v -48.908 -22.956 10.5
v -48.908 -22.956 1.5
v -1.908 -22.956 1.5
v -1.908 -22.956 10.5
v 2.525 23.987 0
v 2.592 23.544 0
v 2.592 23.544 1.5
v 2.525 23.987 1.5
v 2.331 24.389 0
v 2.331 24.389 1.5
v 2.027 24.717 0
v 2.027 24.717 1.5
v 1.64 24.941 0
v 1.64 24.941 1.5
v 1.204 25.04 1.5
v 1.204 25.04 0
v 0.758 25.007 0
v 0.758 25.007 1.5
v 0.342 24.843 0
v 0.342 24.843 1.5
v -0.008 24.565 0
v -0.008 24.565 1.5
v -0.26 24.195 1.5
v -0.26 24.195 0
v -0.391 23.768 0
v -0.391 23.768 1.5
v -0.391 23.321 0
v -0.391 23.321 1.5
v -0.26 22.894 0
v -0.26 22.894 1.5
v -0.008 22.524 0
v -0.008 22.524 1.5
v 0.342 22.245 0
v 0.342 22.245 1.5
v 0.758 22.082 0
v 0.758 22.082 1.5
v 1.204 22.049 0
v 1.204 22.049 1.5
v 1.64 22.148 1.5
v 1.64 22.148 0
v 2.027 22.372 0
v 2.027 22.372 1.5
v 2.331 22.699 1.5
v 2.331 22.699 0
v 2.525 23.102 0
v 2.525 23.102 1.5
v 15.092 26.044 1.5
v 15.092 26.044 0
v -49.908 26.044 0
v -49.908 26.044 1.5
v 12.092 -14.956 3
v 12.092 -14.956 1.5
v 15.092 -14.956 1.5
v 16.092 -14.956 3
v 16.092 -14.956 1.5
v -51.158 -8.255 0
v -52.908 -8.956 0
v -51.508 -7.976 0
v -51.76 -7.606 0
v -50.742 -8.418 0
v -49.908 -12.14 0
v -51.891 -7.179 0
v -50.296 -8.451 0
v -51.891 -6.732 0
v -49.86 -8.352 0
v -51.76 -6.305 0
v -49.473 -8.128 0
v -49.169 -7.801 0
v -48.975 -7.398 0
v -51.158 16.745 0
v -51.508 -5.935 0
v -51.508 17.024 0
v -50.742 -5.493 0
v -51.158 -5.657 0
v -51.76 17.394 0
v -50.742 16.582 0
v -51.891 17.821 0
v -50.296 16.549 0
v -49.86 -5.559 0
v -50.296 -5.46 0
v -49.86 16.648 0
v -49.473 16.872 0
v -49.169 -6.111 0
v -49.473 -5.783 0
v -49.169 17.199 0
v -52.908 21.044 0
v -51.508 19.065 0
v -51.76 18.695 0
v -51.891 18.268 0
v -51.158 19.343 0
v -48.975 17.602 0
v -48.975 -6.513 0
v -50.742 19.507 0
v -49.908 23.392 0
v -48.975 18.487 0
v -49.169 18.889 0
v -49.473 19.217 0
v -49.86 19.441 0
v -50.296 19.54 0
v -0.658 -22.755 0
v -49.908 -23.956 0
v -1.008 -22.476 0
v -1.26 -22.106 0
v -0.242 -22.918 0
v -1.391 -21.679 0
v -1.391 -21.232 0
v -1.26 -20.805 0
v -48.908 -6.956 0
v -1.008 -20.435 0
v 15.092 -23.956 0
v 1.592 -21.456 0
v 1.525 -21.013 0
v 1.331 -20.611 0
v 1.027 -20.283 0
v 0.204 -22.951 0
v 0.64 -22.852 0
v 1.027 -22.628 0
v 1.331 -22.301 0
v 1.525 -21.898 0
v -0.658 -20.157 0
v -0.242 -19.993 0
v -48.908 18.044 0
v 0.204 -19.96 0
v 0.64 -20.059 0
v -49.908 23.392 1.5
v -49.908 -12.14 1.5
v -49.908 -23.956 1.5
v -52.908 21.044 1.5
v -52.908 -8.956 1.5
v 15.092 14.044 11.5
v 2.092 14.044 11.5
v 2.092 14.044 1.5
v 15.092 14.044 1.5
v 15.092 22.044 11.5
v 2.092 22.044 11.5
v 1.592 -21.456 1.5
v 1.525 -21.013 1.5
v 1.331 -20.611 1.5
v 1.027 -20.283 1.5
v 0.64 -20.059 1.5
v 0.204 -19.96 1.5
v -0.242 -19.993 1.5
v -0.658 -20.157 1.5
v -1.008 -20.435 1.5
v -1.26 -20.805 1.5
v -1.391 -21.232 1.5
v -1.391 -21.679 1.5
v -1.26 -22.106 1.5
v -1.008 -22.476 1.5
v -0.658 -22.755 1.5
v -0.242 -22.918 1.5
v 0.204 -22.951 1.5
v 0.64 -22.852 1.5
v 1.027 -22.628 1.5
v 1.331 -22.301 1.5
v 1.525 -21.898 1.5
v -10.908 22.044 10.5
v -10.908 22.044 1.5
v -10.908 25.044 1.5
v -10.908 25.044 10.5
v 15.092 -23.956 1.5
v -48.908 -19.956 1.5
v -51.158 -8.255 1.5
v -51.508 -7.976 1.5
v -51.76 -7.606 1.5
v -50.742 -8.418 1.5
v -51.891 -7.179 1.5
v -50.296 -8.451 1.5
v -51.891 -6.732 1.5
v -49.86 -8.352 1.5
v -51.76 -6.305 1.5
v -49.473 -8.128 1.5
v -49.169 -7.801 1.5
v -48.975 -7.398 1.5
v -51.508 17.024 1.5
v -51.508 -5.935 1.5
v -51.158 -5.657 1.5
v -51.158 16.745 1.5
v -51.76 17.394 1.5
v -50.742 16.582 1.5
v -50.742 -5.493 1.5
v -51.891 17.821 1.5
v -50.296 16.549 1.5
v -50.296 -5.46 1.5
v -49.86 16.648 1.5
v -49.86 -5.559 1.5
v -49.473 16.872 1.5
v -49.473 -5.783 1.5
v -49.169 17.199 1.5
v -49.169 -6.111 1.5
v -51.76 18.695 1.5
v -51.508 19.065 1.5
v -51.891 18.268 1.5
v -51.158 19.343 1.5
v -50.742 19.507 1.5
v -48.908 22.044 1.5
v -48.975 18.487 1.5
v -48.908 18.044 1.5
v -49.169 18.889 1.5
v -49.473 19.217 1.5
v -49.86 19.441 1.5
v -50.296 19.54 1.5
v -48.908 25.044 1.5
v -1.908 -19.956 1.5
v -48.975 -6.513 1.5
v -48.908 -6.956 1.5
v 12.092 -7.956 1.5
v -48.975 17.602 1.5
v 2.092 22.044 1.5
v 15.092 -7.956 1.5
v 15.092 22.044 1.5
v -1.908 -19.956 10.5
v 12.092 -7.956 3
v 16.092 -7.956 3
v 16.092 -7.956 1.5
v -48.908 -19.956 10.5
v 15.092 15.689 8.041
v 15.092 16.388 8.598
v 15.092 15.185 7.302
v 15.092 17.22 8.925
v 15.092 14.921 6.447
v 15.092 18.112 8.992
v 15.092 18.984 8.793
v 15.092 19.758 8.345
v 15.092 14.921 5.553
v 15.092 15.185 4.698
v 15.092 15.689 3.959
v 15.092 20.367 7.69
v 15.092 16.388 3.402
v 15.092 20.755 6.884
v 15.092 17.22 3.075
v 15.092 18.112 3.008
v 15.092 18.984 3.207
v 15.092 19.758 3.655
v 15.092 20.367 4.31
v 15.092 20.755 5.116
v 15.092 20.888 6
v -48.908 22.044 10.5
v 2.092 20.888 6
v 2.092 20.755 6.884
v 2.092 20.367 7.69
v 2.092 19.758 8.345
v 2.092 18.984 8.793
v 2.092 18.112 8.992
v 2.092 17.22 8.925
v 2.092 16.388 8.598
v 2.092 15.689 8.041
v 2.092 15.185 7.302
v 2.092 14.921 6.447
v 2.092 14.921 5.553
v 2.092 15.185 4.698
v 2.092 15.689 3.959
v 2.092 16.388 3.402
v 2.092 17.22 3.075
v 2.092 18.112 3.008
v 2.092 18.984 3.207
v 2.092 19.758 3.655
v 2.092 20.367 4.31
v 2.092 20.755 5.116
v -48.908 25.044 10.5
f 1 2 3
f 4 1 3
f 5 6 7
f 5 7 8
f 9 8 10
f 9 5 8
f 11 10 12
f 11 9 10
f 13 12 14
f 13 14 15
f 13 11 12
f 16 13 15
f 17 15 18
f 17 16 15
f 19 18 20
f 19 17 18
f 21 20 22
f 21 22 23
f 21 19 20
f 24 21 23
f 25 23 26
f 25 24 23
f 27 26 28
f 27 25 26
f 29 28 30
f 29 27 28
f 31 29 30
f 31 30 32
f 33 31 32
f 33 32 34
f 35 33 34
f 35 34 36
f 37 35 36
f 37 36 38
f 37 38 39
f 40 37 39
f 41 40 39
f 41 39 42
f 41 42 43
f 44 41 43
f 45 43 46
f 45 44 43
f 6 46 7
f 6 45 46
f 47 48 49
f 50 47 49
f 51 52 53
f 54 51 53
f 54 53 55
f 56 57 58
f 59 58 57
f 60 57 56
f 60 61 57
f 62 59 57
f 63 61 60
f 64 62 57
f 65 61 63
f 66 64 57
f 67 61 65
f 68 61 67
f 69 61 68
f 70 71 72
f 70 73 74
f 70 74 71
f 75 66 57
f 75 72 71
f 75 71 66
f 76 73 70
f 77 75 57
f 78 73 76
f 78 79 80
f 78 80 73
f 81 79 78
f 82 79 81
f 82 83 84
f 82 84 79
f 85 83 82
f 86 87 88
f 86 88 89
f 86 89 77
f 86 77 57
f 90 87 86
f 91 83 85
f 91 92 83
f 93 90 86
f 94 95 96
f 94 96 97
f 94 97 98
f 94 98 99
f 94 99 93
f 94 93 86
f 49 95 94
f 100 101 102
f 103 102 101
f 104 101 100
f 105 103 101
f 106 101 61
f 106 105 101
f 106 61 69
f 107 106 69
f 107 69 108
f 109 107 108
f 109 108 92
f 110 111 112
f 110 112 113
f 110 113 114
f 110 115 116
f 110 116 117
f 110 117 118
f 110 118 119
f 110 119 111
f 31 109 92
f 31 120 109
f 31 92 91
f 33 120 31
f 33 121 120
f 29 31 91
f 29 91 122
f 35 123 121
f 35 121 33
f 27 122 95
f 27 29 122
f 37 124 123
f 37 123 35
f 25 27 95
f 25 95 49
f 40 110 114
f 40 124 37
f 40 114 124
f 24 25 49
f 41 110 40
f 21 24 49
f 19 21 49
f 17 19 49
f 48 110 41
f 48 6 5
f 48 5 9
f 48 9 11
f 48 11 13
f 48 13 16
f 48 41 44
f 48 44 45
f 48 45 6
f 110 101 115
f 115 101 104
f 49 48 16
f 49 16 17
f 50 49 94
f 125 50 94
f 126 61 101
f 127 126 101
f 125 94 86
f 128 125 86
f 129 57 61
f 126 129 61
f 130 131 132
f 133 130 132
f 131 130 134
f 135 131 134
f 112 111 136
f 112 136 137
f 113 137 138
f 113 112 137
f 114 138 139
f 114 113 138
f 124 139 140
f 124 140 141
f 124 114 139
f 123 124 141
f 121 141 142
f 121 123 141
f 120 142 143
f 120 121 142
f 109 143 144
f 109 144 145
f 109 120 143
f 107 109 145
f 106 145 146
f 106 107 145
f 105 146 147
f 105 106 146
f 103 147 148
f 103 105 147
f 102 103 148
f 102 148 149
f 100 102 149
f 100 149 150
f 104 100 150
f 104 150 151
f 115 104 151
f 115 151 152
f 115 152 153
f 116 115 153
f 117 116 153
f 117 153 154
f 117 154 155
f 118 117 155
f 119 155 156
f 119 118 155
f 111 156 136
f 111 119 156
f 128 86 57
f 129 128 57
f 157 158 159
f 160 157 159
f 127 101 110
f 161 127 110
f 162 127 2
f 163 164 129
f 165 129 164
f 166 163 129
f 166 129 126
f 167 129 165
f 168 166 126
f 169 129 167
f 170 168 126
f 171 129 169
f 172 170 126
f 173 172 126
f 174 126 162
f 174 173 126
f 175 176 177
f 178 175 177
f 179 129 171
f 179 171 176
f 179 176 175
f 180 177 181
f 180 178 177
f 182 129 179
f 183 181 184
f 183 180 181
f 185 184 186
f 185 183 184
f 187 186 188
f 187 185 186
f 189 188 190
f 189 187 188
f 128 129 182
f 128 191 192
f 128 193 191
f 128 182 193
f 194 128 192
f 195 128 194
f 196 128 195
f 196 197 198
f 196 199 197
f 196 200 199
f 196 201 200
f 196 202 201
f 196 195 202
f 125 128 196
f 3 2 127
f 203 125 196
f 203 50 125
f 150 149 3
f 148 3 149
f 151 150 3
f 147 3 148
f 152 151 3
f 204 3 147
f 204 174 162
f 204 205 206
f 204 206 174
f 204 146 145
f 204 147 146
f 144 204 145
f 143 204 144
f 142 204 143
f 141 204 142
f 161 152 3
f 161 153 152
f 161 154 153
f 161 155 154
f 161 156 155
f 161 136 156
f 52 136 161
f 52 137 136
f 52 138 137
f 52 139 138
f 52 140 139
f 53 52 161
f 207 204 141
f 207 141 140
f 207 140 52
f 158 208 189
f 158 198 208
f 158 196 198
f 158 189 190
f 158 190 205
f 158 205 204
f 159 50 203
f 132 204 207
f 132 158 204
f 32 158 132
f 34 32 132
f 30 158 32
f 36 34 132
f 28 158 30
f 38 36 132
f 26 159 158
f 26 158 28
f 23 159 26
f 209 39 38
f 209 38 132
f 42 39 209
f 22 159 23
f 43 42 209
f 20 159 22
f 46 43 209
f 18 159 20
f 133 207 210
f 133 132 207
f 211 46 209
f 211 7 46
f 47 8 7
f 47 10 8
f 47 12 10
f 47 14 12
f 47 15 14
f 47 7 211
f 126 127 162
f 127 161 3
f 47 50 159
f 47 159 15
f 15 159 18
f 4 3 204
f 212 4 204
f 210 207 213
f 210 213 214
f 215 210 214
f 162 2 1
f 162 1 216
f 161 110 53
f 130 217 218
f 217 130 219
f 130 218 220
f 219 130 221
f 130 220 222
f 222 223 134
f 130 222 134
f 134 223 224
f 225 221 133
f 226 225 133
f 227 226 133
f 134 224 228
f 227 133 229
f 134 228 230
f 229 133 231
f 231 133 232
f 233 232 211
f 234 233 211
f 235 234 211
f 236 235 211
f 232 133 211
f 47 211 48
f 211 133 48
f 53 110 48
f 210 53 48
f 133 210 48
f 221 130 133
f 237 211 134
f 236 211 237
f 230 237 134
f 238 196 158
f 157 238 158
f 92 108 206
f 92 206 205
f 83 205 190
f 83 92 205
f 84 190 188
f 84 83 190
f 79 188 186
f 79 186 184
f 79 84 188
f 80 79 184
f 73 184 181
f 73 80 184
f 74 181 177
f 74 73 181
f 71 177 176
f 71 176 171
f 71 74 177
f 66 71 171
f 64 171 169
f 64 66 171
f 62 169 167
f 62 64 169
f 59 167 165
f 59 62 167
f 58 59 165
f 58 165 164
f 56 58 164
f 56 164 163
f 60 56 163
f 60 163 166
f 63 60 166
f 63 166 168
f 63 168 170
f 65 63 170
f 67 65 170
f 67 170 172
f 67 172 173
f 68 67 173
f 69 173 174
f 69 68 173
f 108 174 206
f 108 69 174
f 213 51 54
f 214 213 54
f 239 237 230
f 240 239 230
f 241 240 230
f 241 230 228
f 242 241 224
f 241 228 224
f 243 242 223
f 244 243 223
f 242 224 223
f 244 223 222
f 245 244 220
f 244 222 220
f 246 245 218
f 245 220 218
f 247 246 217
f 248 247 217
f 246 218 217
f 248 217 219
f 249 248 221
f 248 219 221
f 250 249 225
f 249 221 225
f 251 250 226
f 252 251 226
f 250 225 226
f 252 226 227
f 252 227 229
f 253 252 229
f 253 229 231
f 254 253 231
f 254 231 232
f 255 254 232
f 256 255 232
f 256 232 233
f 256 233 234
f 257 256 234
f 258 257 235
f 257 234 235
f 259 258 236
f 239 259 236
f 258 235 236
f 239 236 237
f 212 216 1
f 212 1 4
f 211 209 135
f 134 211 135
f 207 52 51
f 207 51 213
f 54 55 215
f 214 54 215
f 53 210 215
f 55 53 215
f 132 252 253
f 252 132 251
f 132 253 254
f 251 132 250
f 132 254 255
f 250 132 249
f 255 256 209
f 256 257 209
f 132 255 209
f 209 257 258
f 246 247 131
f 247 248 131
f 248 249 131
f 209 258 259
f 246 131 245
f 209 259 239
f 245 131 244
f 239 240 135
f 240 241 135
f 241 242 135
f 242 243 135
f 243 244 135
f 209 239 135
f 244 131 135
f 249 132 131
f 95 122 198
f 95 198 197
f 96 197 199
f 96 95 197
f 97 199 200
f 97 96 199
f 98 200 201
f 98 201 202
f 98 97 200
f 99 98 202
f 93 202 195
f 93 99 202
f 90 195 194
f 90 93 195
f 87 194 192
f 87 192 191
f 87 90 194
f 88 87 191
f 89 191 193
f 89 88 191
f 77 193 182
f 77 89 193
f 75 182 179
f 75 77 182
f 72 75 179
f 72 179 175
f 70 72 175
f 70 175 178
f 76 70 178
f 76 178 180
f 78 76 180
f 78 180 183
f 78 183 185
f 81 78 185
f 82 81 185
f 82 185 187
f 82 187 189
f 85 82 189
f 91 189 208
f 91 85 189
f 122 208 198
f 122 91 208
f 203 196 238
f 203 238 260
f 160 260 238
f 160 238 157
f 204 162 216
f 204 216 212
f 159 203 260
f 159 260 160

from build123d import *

# Parameters (mm, degrees)
F0_R     = 1.5
F1_DEPTH = 1.5
F2_W     = 38
F2_H     = 3
F2_W_2   = 47
F3_DEPTH = 9
F4_W     = 4
F4_H     = 7
F5_DEPTH = 1.5
F6_W     = 8
F6_H     = 1.5
F6_H_2   = 10
F6_R     = 3
F7_DEPTH = 13


with BuildPart() as f1:
    # F0 (on Top) → F1 (new body)
    with BuildSketch(Plane.XY):
        Polygon((15.091755, -23.95556), (15.091755, 26.04444), (-49.908245, 26.04444), (-49.908245, 23.392303), (-52.908245, 21.04444), (-52.908245, -8.95556), (-49.908245, -12.139853), (-49.908245, -23.95556), align=None)
        with Locations((-50.408245, -6.95556)):
            Circle(F0_R, mode=Mode.SUBTRACT)
        with Locations((0.091755, -21.45556)):
            Circle(F0_R, mode=Mode.SUBTRACT)
        with Locations((-50.408245, 18.04444)):
            Circle(F0_R, mode=Mode.SUBTRACT)
        with Locations((1.091755, 23.54444)):
            Circle(F0_R, mode=Mode.SUBTRACT)
    extrude(amount=F1_DEPTH)

    # F2 (on face) → F3 (join)
    with BuildSketch(Plane.XY.offset(1.5)):
        with Locations((-29.908245, 23.54444)):
            Rectangle(F2_W, F2_H)
        with Locations((-25.408245, -21.45556)):
            Rectangle(F2_W_2, F2_H)
    extrude(amount=F3_DEPTH)

    # F4 (on face) → F5 (join)
    with BuildSketch(Plane.XY.offset(1.5)):
        with Locations((14.091755, -11.45556)):
            Rectangle(F4_W, F4_H)
    extrude(amount=F5_DEPTH)

    # F6 (on face) → F7 (join)
    with BuildSketch(Plane.YZ.offset(15.091755)):
        with Locations((18.04444, 0.75)):
            Rectangle(F6_W, F6_H)
        with Locations((18.04444, 6.5)):
            Rectangle(F6_W, F6_H_2)
        with Locations((17.887879, 6)):
            Circle(F6_R, mode=Mode.SUBTRACT)
    extrude(amount=-F7_DEPTH)


solid = f1.part
